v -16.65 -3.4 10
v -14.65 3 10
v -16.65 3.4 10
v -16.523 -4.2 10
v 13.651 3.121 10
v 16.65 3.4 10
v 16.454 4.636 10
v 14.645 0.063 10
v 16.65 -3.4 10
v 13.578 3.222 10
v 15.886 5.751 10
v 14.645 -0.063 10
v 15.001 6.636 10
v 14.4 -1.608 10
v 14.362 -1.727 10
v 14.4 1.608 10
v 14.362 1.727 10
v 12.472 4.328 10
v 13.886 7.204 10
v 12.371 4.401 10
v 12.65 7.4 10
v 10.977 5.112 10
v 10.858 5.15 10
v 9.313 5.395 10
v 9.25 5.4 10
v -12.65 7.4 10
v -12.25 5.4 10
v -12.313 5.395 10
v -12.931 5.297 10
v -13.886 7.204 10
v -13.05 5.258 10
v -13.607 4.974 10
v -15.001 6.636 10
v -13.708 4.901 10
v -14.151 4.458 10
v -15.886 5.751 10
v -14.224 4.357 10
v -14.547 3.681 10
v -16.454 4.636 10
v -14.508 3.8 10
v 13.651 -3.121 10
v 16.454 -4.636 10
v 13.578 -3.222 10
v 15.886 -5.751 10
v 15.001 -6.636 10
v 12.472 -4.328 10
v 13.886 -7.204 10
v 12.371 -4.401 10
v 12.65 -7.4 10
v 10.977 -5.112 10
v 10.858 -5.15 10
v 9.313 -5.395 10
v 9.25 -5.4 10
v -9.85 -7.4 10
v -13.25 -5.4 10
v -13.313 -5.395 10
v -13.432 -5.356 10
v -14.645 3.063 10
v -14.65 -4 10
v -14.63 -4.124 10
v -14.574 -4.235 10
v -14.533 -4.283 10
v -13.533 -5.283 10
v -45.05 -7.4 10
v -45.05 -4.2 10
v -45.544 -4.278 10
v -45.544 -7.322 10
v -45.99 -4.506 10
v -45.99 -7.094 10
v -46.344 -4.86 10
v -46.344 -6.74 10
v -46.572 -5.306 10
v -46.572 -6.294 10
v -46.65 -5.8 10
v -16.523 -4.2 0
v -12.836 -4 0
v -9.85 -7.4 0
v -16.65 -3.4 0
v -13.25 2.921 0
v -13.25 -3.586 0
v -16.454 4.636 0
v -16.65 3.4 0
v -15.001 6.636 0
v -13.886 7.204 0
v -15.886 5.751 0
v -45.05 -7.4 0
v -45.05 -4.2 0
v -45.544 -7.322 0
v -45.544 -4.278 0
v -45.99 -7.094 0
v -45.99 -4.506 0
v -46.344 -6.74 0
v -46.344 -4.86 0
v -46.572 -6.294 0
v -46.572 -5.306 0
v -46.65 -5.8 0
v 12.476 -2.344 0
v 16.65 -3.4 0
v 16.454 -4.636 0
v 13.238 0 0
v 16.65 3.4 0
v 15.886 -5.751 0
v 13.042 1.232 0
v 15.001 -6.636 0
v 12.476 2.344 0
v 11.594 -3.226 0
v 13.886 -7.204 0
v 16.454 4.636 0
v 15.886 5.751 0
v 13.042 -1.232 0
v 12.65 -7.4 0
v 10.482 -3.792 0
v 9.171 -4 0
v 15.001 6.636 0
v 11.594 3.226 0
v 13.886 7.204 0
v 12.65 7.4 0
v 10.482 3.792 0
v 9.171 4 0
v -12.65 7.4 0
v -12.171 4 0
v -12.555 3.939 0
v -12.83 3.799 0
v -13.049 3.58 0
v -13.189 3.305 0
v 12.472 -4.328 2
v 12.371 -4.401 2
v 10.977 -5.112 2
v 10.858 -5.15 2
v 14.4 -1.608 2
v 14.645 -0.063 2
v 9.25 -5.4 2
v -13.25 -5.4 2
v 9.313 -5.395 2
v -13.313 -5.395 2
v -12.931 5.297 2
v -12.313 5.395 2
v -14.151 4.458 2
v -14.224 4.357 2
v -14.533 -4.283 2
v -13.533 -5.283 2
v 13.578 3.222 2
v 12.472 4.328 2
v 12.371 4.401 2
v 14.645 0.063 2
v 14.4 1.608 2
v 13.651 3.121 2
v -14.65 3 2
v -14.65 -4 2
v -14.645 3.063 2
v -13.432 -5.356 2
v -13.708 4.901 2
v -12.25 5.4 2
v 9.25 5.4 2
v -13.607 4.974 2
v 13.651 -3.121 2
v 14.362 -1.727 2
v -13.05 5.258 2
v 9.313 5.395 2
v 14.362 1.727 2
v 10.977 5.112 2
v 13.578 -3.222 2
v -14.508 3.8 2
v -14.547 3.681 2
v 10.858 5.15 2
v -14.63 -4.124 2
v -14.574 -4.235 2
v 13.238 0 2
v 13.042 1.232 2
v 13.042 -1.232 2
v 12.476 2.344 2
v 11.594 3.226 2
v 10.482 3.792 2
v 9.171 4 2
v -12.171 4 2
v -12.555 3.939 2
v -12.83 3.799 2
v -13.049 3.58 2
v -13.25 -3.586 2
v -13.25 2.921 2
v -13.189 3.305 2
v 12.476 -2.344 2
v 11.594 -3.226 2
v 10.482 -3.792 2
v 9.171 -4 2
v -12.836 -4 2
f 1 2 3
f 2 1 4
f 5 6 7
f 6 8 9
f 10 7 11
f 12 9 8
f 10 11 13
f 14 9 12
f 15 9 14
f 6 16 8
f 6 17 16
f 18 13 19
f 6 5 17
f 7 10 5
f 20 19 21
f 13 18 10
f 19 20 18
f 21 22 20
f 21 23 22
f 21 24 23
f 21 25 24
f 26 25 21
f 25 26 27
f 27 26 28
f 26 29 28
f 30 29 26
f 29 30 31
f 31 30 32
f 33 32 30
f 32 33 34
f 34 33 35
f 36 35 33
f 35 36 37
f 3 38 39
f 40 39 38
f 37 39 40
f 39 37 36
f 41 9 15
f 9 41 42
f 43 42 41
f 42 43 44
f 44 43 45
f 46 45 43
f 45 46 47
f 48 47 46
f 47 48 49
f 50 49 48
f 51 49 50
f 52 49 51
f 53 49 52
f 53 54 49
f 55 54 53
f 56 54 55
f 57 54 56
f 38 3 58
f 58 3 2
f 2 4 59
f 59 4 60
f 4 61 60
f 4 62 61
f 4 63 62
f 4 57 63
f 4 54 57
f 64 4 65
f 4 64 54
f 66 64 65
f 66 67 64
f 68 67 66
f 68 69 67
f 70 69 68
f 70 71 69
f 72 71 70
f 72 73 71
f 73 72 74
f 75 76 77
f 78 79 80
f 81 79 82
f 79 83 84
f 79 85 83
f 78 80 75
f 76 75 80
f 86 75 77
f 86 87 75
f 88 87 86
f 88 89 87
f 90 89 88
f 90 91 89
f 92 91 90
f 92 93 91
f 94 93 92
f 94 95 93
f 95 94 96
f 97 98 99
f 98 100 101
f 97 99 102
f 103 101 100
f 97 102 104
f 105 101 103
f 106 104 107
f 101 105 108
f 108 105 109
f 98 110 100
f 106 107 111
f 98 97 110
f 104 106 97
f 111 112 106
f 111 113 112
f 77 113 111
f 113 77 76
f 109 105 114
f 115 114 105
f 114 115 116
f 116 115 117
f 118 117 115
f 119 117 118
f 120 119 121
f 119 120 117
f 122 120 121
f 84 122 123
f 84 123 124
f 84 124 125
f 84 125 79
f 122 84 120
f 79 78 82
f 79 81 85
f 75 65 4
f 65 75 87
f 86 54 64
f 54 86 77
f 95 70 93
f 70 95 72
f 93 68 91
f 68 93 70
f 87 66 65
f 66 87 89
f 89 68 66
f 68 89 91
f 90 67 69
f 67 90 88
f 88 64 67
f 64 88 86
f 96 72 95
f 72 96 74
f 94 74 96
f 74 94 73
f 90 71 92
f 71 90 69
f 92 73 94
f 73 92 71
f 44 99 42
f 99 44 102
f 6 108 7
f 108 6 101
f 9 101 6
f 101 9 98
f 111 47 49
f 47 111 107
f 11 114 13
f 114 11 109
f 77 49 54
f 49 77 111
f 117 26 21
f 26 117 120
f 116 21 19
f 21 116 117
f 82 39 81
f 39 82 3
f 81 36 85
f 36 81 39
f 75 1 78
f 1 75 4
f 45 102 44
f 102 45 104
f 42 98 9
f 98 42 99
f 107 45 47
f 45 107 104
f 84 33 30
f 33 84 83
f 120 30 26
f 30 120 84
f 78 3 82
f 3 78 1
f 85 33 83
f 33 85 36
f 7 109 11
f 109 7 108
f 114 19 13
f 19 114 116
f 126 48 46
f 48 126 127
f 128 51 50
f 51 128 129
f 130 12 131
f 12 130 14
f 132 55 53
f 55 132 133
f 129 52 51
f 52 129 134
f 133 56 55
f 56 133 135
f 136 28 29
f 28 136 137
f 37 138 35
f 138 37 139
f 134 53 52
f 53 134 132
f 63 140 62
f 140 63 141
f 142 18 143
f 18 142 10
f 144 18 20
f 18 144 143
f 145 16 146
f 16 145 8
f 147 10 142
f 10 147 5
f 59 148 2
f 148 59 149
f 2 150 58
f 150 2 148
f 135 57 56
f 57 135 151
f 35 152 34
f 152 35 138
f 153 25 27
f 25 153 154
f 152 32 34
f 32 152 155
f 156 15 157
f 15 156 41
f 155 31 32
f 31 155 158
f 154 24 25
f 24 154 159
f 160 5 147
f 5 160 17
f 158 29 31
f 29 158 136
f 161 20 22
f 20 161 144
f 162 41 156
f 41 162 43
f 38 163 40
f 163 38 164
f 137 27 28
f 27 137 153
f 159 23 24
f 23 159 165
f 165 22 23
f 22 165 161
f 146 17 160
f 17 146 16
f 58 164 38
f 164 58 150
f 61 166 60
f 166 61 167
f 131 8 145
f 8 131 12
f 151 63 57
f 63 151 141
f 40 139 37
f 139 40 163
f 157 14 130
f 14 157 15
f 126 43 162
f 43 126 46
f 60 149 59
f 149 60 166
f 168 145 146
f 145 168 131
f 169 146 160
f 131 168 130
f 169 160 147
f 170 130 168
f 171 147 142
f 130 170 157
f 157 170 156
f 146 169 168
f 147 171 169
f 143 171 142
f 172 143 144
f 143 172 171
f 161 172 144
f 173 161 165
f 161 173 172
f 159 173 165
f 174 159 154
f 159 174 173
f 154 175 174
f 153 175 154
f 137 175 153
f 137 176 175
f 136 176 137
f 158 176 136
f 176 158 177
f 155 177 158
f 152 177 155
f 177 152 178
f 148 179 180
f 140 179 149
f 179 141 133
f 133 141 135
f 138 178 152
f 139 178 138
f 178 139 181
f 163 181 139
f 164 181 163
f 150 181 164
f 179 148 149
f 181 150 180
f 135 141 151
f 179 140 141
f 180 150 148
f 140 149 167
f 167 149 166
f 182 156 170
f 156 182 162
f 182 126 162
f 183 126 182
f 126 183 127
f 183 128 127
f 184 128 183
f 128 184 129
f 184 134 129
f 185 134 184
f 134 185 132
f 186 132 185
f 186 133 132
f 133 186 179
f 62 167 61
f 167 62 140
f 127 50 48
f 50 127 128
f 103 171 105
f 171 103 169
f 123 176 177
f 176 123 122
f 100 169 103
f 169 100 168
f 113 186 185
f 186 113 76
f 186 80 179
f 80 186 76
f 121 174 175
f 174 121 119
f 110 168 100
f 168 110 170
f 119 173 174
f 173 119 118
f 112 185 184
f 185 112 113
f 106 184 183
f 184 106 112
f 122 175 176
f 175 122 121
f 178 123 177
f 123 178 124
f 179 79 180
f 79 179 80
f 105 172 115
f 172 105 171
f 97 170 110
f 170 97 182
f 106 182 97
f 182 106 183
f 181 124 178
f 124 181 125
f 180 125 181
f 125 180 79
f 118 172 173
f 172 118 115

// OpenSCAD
$fn=20;

/* -- [Dimensions] -- */
extrusionWidth=0.4;
wallCount=8;
screwDia=3.5;
counterSinkDia=8.5; 
bookDims=[117*2,326,17.8];
feetDims=[9,21.5,2.2];
feetDist=[190,236,212.5]; //x, y1, y2
feetxOffset=(25.5-17.5)/2;
tblThck=19.4;
spcng=1;
fudge=0.1;

/* --[hidden] -- */
minWallThck=extrusionWidth*wallCount;

HPEliteBook840G5();
//left back
translate([-(bookDims.x+minWallThck)/2-spcng/2,(feetDist[1])/2,(bookDims.z+spcng)/2-feetDims.z/2-spcng/2]) 
  clamp(stopper=true,isLeft=true);
mirror([1,0,0]) translate([-(bookDims.x+minWallThck)/2-spcng/2,(feetDist[2])/2,(bookDims.z+spcng)/2-feetDims.z/2-spcng/2])  
  clamp(stopper=true,isLeft=false);
translate([-(bookDims.x+minWallThck)/2-spcng/2,-(feetDist[1])/2,(bookDims.z+spcng)/2-feetDims.z/2-spcng/2]) 
  clamp(stopper=false,isLeft=true);
mirror([1,0,0]) translate([-(bookDims.x+minWallThck)/2-spcng/2,-(feetDist[2])/2,(bookDims.z+spcng)/2-feetDims.z/2-spcng/2])  
  clamp(stopper=false,isLeft=false);


//USBHub
translate([0,bookDims.y/2,bookDims.z+minWallThck+tblThck]) rotate(180) USBHub();
*clamp(false);
module clamp(stopper=true,isLeft=true){
  topWdth=20;
  footxOffset= isLeft ? feetxOffset : -feetxOffset;
  bottomWdth=(bookDims.x-feetDist.x+minWallThck+spcng+feetDims.x)/2+feetDims.x+footxOffset;
  clampWdth=50;
  rad=4; //edge radii (median line)
  radOffset=rad-minWallThck/2;
  stprPos=[bottomWdth-feetDims.x*1.5,0,-(bookDims.z+feetDims.z+spcng)/2];
  plateZOffset=(bookDims.z+minWallThck+feetDims.z+spcng)/2;
  
  rotate([90,0,0]){
    linear_extrude(clampWdth,center=true)
      square([minWallThck,bookDims.z+feetDims.z-radOffset*2+spcng],true);
  
    //bottom radius
    translate([rad,-((bookDims.z+feetDims.z+spcng)/2-radOffset),0])
      rotate([0,0,180]) rotate_extrude(angle=90) 
        translate([rad,0]) square([minWallThck,clampWdth],true);
    //top radius
    translate([rad,((bookDims.z+feetDims.z+spcng)/2-radOffset),0])
      rotate([0,0,90]) rotate_extrude(angle=90) 
        translate([rad,0]) square([minWallThck,clampWdth],true);
  }
    //top screwplate
    translate([0,0,plateZOffset]) plate(top=true);
  
    //bottom restplate
    translate([0,0,-plateZOffset]) plate(top=false);
  
    //stopper
    if (stopper)
      //color("red") translate(stprPos) sphere(2);
      translate(stprPos){
        difference(){
          translate([0,clampWdth/4,feetDims.z/2]) cube([feetDims.x*2,clampWdth/2,feetDims.z],true);
          hull() for (iy=[-1,1])
            translate([0,iy*(feetDims.y-feetDims.x)/2,feetDims.z/2]) 
              cylinder(d=feetDims.x,h=feetDims.z+fudge,center=true);
              for(iy=[-1,1]) 
                translate([topWdth/2,iy*clampWdth/4,-plateZOffset+(minWallThck-fudge)/2]-stprPos) 
                  cylinder(d=screwDia*2+spcng,h=feetDims.z+fudge);
         }
         for (ix=[-1,1])
           translate([ix*feetDims.x*0.75,0,feetDims.z/2]) 
            cylinder(d=feetDims.x/2,h=feetDims.z,center=true);
      }
      
  module plate(top=false){
    width= top ? topWdth : bottomWdth;
    
    difference(){
      union(){
        translate([(width)/2,0,0])
          cube([width-rad*2,clampWdth,minWallThck],true);
        hull() for(iy=[-1,1])
          translate([width-rad,iy*(clampWdth/2-rad),0]) cylinder(r=rad,h=minWallThck,center=true);
      }
      if (top) for(iy=[-1,1]){
        translate([topWdth/2,iy*clampWdth/4,0]){
          cylinder(d=screwDia+fudge,h=minWallThck+fudge,center=true);
        translate([0,0,-(minWallThck+fudge)/2]) 
          cylinder(d1=counterSinkDia,d2=0.05,h=counterSinkDia/2);
        }
      }
      else
        for(iy=[-1,1]) 
        translate([topWdth/2,iy*clampWdth/4,0]) 
          cylinder(d=screwDia*2+spcng,h=minWallThck+fudge,center=true);
    }    
  }  
}

module HPEliteBook840G5(){
  crnRad=3;
  //color("silver") translate([-234/2,0,0]) rotate([90,0,0]) linear_extrude(326,center=true) import("EliteBook840G5_contour.svg");
  
  color("silver") translate([0,0,bookDims.z/2]) rotate([90,0,0]) linear_extrude(bookDims.y,center=true) 
    hull() for (ix=[-1,1],iy=[-1,1])
      translate([ix*(bookDims.x/2-crnRad),iy*(bookDims.z/2-crnRad)]) circle(crnRad);
  //feet
  color("darkgrey")for (iy=[-1,1]){
    translate([-feetDist.x/2+feetxOffset,iy*feetDist[1]/2,0]) foot();
    translate([feetDist.x/2+feetxOffset,iy*feetDist[2]/2,0]) foot();
  }
  
  module foot(){
    hull() for (iy=[-1,1]) 
      translate([0,iy*(feetDims.y-feetDims.x)/2,-feetDims.z]) 
        cylinder(d=feetDims.x,h=feetDims.z);
  }
}


*USBHub();
module USBHub(){
  //roline USB-C HUB 14025039
  //https://www.reichelt.de/usb-3-0-hub-4-port-usb-c-zu-4x-usb-3-0-typ-a-roline-14025039-p289002.html
  bdyDims=[93.5,28.5,10];
  crnRad=2;
  chmfer=1;
  spcng=0.4;
  hubMinWallThck=2;
  capHght=5*hubMinWallThck;
  
  poly=[[-bdyDims.y/2+chmfer,-bdyDims.z/2],[-bdyDims.y/2,-bdyDims.z/2+chmfer],[-bdyDims.y/2,bdyDims.z/2-crnRad],
        [-bdyDims.y/2+crnRad,bdyDims.z/2-crnRad],[-bdyDims.y/2+crnRad,-bdyDims.z/2]];
  translate([0,0,bdyDims.z/2]) rotate([90,0,90]){
    difference(){ //body
      color("sandybrown") linear_extrude(bdyDims.x,center=true)     
        hubShape();
      translate([0,0,-bdyDims.x/2+5]) cube([12.3,4.6,10+fudge],true);
    }
    //cable strain relief
    color("darkSlateGrey") translate([0,0,bdyDims.x/2]) cylinder(d=6,h=8.6);
  }
  !endCap();
  module endCap(){
    endCapDims=[bdyDims.y+(hubMinWallThck+spcng)*2,capHght,bdyDims.z+(hubMinWallThck+spcng)*2];
    //translate([endCapDims.x/2,0,endCapDims.z/2]) rotate([90,0,180]) 
    difference(){
      union(){
        hull() for(ix=[-1,1],iy=[-1,1])
          translate([ix*(bdyDims.y/2-crnRad+spcng),iy*(bdyDims.z/2-crnRad+spcng),0]) 
            cylinder(r=crnRad+hubMinWallThck,h=capHght);
        translate([-30-endCapDims.x/2+minWallThck/2,-endCapDims.z/2,0]){
          cube([30+crnRad+minWallThck,minWallThck,capHght]);
          translate([0,minWallThck/2,0]) cylinder(d=minWallThck,h=capHght);
        }
      }
      translate([0,0,hubMinWallThck]) linear_extrude(capHght-hubMinWallThck+fudge) offset(spcng) hubShape();
      translate([0,0,-fudge/2]) linear_extrude(hubMinWallThck+fudge) offset(-hubMinWallThck/2) hubShape();
    }
  }
  
  module hubShape(){
    translate([(bdyDims.y-bdyDims.z)/2,0]) circle(d=bdyDims.z);
        translate([-bdyDims.z/4+crnRad/2,0]) square([bdyDims.y-bdyDims.z/2-crnRad,bdyDims.z],true);
        translate([-bdyDims.y/2+crnRad,bdyDims.z/2-crnRad]) circle(crnRad);
        polygon(poly);
  }
}
